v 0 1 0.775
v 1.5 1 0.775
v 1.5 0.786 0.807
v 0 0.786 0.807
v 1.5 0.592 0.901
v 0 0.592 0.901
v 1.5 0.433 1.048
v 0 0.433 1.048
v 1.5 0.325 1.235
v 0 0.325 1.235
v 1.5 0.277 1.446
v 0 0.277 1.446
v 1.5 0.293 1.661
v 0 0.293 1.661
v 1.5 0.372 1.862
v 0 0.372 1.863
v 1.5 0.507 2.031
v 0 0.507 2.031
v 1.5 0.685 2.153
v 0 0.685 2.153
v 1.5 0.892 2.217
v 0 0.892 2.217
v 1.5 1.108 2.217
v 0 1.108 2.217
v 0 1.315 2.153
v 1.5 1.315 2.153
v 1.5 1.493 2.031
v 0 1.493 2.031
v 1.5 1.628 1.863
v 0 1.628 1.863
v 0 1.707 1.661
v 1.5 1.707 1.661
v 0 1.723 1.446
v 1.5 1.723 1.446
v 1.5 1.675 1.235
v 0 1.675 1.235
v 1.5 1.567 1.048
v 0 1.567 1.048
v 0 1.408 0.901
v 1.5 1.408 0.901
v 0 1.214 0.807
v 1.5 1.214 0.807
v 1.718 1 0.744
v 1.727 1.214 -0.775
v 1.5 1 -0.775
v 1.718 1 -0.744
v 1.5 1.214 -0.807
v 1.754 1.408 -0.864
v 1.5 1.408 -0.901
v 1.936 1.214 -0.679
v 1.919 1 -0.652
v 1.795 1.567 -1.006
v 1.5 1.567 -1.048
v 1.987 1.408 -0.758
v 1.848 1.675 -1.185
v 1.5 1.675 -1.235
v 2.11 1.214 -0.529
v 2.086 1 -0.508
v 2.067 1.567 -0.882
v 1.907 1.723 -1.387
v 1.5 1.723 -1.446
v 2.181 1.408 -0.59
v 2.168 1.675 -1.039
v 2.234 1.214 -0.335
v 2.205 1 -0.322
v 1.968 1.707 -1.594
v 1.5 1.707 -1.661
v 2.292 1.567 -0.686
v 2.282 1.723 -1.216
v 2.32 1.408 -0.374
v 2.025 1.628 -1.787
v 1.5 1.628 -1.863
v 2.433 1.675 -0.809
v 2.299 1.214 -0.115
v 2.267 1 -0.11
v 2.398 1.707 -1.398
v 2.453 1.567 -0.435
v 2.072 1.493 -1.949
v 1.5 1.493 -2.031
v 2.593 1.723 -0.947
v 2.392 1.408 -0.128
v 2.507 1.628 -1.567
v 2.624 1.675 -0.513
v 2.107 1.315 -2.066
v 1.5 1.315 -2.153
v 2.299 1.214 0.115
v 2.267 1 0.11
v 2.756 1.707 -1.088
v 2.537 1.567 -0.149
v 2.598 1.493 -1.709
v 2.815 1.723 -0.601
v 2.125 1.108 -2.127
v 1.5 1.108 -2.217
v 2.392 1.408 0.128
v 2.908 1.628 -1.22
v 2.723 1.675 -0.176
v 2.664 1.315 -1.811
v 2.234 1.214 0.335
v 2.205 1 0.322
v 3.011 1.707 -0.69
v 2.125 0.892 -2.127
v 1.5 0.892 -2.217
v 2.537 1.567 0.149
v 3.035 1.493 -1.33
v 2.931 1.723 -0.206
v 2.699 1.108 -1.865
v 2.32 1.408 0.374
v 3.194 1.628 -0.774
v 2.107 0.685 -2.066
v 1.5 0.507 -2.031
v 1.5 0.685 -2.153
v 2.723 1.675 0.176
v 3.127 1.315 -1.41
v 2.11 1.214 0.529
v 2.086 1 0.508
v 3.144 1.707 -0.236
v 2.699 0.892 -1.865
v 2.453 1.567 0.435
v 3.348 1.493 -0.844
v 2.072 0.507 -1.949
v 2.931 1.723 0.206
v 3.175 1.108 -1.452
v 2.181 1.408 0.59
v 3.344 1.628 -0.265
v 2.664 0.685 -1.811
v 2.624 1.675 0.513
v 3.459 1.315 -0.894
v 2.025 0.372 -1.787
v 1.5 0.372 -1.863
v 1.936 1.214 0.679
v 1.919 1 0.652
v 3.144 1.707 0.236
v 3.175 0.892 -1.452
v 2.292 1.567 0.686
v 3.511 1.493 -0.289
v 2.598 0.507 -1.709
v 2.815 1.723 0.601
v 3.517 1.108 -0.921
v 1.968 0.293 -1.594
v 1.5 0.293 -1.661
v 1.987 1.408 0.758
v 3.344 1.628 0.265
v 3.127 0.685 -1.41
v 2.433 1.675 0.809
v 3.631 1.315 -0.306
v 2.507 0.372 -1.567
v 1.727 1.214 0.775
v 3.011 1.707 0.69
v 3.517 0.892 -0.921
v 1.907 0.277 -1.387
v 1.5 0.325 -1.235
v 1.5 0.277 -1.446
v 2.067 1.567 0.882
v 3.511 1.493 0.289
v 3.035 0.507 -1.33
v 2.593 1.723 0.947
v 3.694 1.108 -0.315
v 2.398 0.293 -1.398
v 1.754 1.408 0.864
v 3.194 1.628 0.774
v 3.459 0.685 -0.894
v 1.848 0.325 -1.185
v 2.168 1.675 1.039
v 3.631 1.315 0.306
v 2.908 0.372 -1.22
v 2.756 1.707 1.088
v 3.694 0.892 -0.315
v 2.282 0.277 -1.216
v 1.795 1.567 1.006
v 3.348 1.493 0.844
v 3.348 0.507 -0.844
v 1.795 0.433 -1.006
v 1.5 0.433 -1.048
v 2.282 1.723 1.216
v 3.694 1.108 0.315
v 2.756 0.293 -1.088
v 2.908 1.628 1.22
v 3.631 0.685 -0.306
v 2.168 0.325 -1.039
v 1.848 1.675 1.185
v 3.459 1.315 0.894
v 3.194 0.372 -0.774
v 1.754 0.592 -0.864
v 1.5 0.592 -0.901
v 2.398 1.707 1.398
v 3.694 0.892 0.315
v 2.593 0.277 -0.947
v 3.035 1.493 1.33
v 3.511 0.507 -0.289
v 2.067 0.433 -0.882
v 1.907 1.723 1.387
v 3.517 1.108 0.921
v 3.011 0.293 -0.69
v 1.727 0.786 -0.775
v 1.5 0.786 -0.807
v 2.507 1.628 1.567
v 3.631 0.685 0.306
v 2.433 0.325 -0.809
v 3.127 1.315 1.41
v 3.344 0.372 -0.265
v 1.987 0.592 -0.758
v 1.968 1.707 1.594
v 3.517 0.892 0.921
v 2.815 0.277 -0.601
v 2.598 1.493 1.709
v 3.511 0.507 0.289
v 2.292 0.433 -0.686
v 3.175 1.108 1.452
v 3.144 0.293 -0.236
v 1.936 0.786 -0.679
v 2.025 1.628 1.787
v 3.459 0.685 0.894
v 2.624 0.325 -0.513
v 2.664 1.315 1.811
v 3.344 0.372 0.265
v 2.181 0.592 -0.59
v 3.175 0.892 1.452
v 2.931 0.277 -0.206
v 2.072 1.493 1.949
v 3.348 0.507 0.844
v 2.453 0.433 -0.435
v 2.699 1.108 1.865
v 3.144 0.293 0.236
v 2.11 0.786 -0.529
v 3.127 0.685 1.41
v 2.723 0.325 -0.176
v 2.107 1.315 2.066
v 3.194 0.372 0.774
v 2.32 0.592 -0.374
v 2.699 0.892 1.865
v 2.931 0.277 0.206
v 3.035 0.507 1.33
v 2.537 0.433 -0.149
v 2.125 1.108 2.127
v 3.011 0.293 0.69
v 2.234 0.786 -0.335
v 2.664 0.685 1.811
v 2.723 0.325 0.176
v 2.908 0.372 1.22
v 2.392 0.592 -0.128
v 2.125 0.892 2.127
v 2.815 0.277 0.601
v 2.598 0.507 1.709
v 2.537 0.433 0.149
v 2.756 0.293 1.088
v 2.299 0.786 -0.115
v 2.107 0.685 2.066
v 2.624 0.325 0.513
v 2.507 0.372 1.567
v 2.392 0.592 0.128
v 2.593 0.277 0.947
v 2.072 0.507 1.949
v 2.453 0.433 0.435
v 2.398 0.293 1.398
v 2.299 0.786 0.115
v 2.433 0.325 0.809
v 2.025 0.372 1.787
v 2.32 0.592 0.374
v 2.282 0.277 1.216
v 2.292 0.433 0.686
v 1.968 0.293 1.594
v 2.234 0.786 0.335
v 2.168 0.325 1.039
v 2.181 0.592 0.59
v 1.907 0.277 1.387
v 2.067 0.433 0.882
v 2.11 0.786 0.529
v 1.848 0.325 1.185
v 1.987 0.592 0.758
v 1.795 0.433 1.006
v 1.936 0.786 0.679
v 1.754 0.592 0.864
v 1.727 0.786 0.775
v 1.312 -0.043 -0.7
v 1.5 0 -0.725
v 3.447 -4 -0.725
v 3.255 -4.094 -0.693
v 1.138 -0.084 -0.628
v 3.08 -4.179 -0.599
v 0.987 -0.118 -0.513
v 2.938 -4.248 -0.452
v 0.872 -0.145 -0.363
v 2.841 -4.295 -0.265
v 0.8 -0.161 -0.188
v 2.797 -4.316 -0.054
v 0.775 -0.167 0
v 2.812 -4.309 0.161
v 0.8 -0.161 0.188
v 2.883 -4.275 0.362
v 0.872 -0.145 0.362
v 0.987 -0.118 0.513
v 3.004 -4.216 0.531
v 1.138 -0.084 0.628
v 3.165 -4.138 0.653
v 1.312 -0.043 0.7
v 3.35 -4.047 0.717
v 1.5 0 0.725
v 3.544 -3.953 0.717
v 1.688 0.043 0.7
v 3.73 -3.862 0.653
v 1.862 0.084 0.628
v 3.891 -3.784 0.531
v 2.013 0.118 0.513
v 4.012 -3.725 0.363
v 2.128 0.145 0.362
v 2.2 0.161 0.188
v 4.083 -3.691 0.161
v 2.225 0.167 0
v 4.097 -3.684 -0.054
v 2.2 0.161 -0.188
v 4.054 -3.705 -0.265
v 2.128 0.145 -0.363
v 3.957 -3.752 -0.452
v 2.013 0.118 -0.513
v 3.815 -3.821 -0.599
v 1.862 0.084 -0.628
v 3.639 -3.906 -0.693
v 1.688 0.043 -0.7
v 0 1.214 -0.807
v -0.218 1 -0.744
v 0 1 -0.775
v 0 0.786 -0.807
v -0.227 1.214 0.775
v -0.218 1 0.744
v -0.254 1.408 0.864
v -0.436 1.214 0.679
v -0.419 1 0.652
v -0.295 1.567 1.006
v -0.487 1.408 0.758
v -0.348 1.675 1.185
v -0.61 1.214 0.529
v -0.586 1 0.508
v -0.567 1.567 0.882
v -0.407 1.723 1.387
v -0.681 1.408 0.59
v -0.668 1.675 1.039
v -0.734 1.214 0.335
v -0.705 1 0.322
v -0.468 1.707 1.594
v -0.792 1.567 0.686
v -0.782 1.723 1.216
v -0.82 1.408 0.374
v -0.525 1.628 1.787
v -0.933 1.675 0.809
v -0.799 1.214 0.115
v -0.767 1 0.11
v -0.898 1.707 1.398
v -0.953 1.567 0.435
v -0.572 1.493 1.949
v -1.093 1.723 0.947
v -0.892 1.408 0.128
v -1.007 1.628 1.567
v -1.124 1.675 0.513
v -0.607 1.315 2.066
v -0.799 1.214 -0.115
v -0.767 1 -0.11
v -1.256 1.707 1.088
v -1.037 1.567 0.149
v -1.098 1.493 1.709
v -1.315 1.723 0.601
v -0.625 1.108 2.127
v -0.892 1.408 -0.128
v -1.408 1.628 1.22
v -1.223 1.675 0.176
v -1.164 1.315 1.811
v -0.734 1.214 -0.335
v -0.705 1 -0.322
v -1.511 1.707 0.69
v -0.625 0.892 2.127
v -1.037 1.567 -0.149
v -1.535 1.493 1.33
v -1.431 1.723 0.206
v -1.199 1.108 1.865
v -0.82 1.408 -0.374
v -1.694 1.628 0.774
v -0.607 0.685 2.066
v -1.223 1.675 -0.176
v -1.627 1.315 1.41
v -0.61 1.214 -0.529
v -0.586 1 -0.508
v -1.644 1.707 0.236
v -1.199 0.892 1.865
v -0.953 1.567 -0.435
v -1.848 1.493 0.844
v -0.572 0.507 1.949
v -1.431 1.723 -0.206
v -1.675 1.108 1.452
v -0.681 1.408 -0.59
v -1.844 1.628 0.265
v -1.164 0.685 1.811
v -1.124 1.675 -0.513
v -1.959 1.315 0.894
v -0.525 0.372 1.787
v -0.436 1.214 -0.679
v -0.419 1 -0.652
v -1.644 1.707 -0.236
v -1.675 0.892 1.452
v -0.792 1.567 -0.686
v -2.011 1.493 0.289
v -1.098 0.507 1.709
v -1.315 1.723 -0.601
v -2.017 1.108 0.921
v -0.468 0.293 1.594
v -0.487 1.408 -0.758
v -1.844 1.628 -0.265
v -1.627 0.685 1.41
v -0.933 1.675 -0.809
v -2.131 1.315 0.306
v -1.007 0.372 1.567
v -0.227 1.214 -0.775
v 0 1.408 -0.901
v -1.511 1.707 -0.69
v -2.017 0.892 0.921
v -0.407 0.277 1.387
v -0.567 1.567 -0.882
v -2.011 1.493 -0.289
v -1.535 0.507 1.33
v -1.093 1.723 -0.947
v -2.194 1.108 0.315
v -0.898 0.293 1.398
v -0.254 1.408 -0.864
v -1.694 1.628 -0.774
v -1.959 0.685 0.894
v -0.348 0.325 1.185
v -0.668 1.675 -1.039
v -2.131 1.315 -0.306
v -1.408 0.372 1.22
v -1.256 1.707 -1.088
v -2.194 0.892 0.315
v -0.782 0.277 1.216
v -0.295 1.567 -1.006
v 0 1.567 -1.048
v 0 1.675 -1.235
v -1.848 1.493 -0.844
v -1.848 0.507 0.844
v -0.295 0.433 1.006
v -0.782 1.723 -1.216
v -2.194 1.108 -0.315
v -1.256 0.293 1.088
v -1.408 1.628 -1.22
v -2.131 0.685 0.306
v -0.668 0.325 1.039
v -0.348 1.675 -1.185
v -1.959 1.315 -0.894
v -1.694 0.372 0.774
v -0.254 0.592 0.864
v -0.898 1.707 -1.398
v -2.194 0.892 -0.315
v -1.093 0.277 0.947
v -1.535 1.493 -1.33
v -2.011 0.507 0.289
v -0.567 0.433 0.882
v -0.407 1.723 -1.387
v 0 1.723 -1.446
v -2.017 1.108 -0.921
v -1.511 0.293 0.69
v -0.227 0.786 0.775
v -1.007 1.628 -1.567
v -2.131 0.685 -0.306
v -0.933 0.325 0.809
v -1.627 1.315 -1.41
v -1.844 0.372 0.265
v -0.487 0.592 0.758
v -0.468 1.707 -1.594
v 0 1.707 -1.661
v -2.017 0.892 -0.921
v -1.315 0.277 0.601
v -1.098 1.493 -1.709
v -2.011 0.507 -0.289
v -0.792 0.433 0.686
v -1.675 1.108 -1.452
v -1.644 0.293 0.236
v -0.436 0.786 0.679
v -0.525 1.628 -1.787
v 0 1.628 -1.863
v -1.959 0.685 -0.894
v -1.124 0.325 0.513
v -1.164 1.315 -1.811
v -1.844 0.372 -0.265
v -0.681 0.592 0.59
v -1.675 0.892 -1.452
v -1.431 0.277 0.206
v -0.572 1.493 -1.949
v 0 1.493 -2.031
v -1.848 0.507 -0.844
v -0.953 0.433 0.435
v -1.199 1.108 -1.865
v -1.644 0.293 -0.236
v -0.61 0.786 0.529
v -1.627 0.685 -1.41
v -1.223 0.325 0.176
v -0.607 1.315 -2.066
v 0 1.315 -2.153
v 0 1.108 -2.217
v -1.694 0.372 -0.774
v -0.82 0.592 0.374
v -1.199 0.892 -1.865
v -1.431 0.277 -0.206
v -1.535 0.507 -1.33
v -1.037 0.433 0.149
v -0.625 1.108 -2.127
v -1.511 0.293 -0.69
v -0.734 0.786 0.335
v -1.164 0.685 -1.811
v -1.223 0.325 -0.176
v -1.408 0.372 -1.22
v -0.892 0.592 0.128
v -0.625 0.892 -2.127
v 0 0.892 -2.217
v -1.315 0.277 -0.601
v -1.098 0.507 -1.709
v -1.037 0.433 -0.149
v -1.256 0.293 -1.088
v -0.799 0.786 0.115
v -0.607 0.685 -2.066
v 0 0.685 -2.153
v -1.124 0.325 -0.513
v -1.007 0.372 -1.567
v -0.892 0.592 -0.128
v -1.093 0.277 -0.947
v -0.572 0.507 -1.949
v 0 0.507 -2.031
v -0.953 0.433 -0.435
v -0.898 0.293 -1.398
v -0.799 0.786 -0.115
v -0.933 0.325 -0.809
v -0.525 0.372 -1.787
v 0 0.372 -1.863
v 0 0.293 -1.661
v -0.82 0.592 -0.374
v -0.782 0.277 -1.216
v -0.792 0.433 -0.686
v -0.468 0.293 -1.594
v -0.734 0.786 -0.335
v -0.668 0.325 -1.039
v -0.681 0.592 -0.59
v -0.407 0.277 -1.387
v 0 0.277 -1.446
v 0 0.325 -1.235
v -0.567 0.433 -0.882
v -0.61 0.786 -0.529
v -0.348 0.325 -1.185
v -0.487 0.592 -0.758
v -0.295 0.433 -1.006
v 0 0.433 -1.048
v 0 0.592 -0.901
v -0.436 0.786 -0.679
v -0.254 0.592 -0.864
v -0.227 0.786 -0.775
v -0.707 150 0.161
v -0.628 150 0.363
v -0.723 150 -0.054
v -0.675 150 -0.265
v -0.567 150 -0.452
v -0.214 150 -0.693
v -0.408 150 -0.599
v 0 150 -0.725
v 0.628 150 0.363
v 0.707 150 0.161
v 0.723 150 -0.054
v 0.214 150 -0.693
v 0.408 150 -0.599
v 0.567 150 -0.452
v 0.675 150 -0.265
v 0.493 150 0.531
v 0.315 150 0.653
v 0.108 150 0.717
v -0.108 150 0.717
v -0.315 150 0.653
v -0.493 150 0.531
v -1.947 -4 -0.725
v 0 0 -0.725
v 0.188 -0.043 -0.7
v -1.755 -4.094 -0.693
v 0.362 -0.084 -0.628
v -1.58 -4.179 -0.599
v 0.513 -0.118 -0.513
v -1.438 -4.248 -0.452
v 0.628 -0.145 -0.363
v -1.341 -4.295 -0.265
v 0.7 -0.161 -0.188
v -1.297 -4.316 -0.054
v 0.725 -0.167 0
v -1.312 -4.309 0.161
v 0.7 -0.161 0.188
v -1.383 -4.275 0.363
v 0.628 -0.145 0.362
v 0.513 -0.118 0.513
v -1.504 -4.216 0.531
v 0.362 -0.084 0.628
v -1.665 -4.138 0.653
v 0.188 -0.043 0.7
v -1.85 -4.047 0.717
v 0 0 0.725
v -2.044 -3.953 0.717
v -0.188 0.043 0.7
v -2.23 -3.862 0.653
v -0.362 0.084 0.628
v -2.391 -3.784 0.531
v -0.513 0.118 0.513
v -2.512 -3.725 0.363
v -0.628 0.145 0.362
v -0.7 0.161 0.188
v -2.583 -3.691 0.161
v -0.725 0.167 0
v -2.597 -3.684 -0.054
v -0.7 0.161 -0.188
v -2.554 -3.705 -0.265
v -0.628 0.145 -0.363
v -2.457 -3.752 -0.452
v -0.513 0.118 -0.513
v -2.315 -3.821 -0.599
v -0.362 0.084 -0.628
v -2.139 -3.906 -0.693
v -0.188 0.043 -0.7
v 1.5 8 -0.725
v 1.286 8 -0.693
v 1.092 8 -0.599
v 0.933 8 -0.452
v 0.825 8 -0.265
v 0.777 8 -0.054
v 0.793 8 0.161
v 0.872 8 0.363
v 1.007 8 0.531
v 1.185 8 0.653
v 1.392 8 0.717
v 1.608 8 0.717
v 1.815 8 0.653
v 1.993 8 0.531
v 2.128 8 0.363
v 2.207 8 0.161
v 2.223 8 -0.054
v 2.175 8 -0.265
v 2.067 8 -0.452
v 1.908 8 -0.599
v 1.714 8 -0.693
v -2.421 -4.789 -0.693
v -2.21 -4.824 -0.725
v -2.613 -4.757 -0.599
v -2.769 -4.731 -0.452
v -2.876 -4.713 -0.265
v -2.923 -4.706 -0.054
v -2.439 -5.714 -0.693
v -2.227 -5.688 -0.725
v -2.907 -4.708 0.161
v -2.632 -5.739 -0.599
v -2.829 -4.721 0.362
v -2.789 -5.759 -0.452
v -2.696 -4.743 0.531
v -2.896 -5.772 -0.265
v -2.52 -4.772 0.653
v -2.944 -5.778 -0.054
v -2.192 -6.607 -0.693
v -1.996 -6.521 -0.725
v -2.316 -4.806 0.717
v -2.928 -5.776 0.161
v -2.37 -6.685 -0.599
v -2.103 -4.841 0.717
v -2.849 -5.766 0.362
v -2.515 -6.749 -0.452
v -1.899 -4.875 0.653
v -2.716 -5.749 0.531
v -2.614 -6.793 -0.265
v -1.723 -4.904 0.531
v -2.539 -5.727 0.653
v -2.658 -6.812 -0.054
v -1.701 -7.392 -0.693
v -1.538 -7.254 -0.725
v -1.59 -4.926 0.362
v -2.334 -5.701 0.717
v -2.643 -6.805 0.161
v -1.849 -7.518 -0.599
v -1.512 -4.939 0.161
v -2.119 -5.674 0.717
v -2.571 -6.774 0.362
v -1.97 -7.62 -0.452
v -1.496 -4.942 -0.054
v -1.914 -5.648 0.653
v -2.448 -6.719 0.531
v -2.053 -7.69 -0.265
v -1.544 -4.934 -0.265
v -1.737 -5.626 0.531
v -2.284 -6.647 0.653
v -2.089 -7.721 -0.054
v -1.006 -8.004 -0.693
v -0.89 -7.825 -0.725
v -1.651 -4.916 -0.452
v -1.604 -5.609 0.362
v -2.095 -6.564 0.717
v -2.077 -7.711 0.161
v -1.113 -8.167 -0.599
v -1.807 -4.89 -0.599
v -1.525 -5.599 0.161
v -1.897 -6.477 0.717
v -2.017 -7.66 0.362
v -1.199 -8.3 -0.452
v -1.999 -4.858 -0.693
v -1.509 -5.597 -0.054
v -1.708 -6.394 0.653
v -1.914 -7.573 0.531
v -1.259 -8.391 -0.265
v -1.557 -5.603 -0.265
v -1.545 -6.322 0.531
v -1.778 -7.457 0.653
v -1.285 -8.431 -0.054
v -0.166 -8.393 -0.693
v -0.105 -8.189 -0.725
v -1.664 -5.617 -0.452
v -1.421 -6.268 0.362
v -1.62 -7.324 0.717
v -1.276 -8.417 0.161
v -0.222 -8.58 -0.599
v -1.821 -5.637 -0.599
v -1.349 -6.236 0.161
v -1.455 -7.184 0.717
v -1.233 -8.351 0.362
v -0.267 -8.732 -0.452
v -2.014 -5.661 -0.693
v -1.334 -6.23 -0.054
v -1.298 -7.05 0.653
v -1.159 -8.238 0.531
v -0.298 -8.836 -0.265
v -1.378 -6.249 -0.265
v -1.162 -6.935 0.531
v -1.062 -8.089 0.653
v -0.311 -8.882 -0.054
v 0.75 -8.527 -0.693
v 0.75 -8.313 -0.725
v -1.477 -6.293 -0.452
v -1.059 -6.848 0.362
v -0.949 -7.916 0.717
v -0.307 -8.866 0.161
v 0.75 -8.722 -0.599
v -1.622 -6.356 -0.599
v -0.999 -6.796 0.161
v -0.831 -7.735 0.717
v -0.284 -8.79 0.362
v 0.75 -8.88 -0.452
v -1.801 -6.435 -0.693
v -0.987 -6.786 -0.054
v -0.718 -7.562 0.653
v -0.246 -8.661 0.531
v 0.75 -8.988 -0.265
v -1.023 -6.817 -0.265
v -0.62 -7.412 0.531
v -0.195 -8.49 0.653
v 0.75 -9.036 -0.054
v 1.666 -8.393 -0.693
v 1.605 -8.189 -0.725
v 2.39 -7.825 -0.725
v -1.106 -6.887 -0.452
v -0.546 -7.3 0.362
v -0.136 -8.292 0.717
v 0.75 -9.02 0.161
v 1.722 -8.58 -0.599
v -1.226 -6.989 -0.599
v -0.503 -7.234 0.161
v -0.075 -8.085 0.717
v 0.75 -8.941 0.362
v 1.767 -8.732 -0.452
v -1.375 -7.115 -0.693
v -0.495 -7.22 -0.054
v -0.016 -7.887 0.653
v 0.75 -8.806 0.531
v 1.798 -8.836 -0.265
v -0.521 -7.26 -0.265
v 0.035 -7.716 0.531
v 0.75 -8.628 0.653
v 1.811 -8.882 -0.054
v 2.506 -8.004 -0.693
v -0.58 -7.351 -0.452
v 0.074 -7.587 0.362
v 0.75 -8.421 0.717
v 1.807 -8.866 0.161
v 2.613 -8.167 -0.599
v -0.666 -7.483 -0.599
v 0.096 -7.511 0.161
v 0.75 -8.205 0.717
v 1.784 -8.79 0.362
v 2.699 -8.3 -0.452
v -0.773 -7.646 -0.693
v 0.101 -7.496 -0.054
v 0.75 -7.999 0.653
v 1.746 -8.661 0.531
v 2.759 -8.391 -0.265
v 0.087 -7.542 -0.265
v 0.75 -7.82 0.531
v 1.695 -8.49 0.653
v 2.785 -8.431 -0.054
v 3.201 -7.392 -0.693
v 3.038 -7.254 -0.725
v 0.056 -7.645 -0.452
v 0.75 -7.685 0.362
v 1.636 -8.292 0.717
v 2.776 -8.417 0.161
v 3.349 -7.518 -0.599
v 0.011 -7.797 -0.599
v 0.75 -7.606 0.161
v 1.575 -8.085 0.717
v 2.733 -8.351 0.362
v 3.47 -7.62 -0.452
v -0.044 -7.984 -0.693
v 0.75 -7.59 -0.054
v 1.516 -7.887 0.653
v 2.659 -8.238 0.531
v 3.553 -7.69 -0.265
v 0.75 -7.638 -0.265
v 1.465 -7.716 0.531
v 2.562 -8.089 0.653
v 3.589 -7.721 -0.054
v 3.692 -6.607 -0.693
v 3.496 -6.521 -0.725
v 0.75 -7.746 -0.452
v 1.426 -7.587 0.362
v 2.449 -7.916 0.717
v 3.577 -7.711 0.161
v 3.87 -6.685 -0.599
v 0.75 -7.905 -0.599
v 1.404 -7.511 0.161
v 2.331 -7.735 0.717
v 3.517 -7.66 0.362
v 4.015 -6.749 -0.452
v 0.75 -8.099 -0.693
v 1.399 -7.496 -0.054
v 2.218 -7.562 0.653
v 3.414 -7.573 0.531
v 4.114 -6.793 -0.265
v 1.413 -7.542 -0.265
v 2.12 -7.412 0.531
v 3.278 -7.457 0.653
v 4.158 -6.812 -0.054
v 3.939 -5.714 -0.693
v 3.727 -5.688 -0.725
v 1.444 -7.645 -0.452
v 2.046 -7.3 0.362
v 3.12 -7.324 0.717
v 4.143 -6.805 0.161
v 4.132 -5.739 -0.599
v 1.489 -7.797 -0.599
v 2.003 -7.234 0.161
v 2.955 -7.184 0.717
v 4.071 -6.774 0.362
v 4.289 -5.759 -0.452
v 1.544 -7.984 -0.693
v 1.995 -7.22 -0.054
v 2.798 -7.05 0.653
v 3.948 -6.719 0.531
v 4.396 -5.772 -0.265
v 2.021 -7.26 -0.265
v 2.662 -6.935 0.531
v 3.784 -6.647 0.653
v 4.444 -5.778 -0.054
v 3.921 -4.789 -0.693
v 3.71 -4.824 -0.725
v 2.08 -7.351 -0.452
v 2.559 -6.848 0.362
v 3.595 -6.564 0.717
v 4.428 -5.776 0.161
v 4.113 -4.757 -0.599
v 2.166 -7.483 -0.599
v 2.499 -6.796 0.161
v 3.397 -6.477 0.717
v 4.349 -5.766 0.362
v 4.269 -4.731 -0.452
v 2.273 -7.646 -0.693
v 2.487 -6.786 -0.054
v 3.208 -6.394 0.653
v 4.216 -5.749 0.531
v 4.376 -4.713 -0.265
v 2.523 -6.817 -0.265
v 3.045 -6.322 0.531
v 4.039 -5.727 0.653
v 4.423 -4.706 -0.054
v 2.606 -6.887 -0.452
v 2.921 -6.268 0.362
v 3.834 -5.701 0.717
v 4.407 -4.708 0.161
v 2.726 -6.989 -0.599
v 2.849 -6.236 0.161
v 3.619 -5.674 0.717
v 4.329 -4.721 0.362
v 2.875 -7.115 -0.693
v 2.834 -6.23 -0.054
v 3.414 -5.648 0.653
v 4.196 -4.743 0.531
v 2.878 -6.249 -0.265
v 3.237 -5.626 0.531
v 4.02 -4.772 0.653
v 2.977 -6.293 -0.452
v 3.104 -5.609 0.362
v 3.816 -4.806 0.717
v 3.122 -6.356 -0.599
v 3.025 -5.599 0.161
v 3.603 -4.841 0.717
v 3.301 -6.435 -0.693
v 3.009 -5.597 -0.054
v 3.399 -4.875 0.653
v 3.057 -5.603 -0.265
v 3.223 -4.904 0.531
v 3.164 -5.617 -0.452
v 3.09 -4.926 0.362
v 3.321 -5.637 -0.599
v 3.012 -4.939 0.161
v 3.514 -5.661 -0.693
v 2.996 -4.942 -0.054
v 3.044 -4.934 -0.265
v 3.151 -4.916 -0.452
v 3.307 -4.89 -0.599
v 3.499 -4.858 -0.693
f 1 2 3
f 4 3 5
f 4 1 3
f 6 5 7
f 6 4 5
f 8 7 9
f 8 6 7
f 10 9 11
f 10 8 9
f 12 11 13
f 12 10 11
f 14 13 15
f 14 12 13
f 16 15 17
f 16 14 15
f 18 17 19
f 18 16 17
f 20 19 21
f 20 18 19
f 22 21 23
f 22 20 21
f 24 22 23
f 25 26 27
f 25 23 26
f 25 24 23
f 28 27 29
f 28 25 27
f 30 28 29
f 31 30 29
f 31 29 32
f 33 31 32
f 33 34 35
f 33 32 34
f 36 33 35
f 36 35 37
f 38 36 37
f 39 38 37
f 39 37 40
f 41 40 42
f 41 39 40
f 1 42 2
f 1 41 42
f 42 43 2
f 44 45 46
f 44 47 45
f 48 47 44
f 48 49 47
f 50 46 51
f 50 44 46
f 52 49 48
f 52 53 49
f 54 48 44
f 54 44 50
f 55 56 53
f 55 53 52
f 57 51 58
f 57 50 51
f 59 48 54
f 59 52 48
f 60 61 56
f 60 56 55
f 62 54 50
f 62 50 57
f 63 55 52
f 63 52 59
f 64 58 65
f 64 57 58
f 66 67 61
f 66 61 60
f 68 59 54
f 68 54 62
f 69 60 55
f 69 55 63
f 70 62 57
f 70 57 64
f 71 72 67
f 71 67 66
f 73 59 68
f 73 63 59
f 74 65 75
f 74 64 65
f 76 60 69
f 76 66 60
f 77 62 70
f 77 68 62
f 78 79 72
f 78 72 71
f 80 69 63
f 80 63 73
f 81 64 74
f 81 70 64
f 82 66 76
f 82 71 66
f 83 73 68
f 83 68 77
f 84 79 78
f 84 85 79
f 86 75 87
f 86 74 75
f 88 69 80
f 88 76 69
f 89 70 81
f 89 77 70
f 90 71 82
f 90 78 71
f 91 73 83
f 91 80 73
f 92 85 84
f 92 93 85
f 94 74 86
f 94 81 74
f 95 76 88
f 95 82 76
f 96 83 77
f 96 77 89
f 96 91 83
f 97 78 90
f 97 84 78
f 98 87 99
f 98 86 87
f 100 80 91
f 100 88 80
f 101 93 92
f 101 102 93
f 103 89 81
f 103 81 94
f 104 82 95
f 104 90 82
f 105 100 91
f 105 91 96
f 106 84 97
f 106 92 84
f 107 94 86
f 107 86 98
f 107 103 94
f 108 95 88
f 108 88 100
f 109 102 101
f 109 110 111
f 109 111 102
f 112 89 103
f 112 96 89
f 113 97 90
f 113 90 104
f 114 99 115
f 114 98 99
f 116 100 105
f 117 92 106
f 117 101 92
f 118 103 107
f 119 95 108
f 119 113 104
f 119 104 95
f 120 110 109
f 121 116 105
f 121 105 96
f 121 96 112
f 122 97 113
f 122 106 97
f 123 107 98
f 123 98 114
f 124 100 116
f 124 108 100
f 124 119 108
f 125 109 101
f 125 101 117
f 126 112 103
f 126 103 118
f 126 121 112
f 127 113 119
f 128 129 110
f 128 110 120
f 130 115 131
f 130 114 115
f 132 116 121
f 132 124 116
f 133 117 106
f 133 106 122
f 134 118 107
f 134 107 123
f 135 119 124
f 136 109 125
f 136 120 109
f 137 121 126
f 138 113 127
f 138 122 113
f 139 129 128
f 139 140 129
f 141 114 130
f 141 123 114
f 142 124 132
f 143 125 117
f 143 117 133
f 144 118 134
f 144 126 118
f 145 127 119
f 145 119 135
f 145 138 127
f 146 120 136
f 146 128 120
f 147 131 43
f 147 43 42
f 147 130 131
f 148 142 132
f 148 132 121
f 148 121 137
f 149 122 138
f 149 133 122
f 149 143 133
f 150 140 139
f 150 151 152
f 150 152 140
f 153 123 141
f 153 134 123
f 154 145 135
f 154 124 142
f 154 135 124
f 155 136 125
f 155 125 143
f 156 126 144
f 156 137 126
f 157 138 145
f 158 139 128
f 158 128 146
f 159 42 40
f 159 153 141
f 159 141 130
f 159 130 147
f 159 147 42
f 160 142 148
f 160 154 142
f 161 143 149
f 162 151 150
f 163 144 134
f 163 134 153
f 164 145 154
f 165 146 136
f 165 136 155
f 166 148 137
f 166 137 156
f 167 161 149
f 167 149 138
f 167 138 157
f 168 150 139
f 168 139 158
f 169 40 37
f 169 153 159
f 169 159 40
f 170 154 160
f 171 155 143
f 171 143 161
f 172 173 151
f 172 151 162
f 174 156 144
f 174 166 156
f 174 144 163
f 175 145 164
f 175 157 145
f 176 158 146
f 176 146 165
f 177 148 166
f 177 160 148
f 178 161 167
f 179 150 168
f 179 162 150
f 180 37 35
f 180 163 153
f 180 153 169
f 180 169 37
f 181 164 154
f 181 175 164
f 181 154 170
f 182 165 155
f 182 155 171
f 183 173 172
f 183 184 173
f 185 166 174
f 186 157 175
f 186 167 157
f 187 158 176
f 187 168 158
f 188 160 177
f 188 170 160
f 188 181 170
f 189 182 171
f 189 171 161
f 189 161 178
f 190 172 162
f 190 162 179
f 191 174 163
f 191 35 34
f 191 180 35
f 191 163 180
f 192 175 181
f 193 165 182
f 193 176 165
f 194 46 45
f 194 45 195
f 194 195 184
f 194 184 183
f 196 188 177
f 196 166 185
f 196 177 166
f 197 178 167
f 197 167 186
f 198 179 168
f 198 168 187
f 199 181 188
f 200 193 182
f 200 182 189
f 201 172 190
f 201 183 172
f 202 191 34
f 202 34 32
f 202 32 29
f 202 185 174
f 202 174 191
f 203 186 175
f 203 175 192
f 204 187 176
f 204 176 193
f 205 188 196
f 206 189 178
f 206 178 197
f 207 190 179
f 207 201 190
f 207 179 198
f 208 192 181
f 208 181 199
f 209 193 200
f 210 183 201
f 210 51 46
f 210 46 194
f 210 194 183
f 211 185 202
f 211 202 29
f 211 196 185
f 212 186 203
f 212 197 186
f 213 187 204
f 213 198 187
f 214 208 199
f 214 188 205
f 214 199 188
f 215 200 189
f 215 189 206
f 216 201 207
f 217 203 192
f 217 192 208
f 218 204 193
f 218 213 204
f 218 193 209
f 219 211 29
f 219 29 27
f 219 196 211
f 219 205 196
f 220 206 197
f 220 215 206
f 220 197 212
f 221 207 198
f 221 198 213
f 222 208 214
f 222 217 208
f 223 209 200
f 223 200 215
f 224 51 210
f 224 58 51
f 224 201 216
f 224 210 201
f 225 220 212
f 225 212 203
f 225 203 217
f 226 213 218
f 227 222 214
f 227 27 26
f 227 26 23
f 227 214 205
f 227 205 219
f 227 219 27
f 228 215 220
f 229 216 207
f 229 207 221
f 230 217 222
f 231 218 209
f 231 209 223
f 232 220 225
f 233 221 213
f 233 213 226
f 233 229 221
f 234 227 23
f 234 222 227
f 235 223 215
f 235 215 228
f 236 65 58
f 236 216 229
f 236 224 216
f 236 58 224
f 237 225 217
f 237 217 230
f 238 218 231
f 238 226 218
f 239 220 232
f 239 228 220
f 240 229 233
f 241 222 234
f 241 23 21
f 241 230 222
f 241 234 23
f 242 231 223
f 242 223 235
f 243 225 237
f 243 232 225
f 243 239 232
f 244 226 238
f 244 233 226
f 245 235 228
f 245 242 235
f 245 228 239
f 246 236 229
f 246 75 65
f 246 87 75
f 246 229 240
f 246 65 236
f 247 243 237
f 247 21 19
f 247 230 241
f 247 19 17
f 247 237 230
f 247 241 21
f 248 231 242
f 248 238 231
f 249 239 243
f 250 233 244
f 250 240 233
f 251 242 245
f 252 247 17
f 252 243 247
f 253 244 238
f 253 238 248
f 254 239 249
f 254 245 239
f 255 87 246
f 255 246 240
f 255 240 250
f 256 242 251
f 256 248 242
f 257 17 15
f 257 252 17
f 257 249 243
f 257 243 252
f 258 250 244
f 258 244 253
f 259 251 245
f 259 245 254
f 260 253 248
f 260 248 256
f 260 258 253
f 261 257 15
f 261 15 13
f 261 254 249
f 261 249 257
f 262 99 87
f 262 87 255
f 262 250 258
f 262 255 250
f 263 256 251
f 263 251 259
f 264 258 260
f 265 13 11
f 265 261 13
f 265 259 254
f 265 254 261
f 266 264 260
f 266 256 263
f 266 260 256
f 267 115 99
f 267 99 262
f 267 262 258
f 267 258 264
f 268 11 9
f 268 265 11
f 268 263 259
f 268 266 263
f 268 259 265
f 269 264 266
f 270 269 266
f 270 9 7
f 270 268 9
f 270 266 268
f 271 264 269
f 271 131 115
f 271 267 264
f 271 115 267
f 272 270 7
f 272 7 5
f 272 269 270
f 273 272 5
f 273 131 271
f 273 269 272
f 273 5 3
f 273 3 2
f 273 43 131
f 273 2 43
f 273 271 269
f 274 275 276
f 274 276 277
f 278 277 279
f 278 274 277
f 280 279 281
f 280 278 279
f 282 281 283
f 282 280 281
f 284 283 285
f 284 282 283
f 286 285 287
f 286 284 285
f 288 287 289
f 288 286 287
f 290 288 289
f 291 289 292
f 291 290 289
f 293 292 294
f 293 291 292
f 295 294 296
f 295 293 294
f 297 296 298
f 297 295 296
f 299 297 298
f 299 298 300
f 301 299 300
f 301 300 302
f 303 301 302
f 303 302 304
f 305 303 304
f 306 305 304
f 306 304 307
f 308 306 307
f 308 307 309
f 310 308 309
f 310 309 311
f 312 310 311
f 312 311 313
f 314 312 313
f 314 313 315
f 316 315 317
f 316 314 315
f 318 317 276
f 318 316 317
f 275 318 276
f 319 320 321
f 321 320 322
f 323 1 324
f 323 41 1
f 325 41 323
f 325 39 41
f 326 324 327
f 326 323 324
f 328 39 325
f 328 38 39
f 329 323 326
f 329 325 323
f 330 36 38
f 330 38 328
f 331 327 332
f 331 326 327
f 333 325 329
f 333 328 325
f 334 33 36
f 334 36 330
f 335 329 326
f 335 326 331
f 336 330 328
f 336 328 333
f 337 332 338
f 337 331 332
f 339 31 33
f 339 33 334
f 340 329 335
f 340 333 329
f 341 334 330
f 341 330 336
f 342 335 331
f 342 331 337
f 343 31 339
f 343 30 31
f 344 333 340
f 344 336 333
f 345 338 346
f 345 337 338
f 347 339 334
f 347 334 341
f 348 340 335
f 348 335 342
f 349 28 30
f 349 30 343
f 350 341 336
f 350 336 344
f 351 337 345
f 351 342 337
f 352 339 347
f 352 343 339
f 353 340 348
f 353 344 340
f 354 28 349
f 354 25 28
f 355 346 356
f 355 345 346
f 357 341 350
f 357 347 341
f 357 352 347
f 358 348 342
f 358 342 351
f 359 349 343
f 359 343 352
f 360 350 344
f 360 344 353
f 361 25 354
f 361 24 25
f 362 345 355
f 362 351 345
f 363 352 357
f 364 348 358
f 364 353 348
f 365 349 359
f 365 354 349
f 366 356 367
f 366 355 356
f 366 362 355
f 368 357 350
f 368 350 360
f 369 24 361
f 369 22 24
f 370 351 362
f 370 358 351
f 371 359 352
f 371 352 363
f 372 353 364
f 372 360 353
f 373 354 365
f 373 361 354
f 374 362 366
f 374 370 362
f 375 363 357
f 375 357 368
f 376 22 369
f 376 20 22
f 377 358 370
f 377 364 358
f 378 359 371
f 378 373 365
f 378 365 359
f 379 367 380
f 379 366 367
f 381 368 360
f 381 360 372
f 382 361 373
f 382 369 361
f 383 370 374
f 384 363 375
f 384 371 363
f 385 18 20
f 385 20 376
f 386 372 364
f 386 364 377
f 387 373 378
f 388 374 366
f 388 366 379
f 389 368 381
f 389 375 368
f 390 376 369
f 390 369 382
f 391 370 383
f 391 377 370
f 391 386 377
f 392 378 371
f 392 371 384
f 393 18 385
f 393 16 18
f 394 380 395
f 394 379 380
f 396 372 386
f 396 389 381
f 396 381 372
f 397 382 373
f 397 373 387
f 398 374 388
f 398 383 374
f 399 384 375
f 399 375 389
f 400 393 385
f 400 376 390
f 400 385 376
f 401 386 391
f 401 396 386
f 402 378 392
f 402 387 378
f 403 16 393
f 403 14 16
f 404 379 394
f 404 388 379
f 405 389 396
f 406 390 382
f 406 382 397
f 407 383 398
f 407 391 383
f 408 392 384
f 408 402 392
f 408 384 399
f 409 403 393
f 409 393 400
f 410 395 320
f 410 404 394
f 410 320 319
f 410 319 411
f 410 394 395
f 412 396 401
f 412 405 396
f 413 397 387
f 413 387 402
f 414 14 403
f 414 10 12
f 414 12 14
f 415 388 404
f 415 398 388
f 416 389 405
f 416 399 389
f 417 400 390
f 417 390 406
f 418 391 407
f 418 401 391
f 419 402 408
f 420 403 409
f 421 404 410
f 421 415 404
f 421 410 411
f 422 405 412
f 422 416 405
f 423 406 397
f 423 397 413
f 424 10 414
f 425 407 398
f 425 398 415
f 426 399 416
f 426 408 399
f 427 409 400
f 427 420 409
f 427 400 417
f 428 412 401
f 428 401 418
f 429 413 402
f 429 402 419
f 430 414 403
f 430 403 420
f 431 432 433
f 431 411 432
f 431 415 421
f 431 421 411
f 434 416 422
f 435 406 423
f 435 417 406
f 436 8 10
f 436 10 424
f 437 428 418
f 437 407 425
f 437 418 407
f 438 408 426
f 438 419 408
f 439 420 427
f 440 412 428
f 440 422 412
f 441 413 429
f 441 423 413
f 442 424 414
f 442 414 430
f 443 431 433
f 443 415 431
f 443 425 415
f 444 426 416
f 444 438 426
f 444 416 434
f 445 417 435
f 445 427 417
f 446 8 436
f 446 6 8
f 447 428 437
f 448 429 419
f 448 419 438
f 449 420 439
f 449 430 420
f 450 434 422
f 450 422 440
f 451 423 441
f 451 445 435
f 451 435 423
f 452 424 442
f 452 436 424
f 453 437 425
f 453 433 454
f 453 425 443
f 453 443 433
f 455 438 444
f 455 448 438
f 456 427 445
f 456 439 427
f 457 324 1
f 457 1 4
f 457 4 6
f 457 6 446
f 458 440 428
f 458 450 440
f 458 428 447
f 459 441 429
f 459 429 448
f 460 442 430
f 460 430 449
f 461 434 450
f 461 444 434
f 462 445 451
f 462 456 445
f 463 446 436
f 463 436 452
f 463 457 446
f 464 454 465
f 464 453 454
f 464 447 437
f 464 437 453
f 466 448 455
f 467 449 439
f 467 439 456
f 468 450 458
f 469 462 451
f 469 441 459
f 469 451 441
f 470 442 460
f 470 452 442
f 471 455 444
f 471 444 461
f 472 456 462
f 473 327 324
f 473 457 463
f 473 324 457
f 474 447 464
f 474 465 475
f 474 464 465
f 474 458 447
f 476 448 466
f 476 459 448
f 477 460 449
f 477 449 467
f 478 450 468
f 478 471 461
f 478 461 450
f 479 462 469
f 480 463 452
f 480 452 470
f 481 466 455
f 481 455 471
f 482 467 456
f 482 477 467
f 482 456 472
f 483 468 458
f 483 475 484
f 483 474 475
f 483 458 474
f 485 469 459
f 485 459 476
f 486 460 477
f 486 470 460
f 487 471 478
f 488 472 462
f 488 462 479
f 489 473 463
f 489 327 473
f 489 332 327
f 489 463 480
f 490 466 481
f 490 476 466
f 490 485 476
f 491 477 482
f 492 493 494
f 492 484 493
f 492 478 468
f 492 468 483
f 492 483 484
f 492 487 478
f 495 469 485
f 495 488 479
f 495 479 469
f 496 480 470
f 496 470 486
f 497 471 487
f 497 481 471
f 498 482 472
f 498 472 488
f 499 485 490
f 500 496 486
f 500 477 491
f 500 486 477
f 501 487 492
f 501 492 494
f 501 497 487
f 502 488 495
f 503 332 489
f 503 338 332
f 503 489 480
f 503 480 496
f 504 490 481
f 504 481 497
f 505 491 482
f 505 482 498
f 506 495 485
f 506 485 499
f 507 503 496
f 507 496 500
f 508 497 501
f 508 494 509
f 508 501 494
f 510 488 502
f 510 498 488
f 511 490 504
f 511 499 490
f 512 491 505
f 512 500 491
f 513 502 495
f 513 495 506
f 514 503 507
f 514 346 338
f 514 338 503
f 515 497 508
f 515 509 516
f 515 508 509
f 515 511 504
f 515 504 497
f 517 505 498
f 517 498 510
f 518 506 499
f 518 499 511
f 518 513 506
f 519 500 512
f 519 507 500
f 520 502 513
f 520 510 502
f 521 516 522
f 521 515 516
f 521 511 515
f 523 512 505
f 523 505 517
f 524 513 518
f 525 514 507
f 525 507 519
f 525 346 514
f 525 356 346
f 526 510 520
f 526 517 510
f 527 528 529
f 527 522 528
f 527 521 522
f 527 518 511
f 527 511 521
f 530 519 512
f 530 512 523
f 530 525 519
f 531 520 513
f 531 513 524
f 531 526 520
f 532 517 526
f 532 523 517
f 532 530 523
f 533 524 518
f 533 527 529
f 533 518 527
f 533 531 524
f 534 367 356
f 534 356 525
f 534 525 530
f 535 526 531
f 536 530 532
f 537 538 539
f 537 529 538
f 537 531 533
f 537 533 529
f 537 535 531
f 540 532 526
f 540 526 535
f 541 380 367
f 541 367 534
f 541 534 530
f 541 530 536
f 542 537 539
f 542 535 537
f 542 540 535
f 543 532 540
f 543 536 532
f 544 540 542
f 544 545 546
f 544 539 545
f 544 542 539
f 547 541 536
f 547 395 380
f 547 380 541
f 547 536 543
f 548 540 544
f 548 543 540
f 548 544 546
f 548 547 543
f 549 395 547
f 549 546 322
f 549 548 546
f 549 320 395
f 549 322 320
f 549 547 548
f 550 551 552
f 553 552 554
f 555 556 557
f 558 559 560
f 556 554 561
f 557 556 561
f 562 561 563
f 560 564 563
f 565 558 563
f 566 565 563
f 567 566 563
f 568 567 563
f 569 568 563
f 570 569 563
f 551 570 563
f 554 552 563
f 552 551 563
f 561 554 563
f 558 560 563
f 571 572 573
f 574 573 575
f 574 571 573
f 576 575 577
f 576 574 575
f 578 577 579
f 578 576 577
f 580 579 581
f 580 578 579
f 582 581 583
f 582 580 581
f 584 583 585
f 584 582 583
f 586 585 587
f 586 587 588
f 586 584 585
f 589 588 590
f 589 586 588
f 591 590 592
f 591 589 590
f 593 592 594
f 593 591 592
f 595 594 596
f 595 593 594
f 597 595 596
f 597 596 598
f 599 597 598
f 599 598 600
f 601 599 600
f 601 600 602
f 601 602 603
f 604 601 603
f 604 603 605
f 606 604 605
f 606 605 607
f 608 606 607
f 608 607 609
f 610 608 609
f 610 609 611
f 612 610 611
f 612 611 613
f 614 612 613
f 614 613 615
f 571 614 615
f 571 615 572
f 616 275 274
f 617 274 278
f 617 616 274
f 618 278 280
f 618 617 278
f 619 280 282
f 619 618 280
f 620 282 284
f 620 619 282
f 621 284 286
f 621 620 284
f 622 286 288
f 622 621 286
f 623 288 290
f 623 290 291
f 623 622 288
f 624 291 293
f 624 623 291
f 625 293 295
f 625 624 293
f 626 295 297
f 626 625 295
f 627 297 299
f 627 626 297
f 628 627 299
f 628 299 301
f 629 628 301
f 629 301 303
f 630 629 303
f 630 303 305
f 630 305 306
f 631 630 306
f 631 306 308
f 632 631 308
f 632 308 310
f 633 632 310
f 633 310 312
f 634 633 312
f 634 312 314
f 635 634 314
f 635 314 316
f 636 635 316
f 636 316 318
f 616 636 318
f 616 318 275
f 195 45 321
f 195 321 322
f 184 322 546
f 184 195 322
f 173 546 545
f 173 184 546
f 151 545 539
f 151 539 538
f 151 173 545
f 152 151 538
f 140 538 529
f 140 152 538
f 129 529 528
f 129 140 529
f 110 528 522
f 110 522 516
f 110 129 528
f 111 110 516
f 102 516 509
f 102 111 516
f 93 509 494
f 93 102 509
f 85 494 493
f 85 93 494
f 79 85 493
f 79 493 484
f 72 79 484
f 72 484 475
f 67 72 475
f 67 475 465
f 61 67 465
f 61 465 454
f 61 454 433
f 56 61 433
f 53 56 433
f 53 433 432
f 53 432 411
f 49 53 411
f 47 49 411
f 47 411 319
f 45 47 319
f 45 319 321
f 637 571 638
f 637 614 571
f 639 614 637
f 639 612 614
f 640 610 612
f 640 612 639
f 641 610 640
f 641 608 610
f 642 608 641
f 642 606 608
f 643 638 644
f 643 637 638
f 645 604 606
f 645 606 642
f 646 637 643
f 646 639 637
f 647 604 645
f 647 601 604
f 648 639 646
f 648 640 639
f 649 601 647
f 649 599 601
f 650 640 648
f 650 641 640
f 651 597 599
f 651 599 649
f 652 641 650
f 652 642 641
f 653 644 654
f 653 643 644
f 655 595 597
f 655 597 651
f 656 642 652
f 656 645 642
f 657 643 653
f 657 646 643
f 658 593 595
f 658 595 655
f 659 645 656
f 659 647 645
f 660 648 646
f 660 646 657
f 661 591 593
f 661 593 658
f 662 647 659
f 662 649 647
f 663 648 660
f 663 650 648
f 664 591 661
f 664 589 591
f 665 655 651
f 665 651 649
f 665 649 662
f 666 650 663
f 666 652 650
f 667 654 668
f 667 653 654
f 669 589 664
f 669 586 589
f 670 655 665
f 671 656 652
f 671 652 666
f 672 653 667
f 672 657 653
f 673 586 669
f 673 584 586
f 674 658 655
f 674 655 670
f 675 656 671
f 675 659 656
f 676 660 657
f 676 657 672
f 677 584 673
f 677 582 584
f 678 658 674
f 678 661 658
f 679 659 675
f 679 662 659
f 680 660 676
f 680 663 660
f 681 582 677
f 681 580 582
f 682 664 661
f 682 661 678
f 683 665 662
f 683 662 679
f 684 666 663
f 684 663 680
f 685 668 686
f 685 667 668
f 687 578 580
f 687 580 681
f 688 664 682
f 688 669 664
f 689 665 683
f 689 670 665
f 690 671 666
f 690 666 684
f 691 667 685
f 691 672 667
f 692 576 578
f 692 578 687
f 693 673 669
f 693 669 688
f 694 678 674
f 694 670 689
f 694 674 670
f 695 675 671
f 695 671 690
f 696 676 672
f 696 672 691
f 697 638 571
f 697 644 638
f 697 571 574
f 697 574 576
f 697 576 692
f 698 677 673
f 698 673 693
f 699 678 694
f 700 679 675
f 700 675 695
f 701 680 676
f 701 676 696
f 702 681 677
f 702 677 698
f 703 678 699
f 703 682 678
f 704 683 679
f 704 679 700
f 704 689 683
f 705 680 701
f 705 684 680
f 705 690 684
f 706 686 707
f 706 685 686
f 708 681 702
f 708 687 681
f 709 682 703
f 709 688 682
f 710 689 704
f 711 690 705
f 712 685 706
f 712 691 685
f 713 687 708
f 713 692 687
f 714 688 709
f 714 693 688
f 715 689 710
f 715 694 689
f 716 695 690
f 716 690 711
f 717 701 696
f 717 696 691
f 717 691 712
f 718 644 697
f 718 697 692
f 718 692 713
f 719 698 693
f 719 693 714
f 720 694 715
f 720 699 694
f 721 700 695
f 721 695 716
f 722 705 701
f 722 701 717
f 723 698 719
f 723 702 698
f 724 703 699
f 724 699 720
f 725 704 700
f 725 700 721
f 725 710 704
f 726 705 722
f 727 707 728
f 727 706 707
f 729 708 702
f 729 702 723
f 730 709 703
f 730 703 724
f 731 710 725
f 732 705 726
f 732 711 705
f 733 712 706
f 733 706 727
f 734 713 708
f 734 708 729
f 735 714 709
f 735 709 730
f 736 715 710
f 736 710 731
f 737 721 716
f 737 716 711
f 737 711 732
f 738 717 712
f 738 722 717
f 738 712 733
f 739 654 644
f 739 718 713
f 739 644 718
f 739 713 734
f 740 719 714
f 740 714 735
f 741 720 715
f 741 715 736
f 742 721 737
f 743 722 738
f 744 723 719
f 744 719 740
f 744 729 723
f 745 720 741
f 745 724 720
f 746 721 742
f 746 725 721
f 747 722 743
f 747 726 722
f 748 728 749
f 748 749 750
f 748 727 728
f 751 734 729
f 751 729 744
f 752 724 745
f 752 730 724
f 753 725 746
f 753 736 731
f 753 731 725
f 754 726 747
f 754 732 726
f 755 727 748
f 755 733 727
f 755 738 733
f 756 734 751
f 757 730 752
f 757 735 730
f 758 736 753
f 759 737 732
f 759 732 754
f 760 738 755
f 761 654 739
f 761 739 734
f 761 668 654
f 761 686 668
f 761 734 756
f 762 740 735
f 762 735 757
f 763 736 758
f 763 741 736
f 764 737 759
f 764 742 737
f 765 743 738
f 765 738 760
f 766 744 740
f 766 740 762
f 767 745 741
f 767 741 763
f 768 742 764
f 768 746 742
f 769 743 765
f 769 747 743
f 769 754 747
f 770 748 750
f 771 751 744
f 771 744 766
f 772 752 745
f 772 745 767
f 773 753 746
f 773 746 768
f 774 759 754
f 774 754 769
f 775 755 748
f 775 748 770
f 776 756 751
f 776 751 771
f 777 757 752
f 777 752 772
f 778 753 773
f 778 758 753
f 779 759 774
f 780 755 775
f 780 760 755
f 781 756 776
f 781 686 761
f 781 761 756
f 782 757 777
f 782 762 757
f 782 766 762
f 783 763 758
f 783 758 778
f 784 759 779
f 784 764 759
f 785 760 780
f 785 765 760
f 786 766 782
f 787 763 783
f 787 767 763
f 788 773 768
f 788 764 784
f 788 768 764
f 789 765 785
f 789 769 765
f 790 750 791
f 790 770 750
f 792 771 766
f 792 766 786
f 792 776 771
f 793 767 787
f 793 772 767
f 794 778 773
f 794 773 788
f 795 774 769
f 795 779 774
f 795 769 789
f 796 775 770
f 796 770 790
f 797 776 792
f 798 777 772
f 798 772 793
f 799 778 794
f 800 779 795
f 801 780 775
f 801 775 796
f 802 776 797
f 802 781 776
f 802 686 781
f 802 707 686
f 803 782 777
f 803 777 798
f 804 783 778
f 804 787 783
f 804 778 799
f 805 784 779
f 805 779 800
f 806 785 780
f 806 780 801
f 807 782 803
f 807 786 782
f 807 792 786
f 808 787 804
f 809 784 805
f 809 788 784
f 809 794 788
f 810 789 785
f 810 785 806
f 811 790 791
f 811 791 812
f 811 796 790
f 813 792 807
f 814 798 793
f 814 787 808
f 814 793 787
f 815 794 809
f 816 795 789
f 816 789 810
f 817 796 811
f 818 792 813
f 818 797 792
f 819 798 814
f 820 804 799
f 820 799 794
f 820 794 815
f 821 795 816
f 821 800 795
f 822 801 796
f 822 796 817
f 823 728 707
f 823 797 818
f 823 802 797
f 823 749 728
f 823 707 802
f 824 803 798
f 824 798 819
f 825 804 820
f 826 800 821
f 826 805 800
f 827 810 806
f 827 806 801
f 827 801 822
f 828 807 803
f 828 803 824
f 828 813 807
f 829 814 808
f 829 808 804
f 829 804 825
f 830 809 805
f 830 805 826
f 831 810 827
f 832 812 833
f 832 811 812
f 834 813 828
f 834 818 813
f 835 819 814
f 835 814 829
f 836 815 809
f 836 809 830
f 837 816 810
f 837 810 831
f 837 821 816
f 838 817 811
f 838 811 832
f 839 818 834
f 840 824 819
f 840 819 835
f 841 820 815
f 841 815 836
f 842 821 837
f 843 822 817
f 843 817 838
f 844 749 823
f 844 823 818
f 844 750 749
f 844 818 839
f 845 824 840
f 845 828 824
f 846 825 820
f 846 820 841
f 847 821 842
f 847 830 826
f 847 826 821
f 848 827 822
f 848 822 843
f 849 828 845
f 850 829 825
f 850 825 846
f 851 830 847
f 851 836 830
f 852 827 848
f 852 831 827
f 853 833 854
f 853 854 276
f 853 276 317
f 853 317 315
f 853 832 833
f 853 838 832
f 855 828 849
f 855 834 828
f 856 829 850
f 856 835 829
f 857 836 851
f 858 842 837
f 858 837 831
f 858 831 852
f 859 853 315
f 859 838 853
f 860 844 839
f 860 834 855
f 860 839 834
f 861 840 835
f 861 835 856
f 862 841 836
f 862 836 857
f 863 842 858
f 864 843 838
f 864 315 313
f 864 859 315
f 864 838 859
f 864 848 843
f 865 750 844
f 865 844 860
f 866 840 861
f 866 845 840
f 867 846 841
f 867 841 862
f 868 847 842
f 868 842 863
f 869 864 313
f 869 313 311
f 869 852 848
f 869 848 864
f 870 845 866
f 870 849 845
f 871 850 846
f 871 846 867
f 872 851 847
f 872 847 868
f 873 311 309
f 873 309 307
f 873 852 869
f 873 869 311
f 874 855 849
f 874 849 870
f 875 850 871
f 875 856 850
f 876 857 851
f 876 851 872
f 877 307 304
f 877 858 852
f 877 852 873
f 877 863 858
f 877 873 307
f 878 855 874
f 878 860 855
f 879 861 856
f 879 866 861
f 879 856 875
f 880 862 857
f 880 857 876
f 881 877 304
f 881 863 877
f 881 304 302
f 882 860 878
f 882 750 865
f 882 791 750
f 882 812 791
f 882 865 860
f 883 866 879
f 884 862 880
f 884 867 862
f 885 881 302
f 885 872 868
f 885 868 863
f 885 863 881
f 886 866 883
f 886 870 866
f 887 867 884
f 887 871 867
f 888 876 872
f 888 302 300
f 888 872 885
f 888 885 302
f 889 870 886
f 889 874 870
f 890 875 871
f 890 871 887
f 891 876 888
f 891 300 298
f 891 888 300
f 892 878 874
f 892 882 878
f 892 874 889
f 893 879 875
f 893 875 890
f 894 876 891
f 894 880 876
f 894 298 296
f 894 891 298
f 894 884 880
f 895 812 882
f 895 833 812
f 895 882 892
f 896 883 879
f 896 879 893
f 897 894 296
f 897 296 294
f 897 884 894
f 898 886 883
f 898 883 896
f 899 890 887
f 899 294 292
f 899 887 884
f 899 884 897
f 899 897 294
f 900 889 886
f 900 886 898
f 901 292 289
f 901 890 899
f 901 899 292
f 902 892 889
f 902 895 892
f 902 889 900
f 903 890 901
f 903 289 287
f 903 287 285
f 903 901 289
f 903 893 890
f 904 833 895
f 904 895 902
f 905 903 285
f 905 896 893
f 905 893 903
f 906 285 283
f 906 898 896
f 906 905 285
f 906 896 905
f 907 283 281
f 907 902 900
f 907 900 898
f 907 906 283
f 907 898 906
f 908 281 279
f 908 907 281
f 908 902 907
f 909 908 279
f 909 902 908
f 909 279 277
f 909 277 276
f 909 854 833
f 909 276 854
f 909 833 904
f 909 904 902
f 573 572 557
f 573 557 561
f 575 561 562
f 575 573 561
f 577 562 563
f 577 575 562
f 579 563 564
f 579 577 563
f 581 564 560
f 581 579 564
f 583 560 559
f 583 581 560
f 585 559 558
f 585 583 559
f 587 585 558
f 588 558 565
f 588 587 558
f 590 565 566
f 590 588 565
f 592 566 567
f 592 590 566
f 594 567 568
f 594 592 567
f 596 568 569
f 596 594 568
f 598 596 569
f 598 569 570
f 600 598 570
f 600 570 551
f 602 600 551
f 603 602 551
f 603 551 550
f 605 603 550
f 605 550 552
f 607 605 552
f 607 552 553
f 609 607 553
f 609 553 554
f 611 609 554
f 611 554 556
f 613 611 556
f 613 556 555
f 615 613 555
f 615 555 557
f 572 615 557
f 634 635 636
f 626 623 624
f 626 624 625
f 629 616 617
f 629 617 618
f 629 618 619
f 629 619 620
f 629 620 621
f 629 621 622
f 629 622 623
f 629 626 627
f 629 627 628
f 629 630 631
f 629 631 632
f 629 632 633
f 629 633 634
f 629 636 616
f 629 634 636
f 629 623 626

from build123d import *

# Parameters (mm, degrees)
SWEEP1_PROFILE_R = 0.725
SWEEP2_PROFILE_R = 0.725


with BuildPart() as part:
    # Sweep1: sweep along a path in Sketch1
    with BuildLine(Plane.XY) as sweep1_path:
        Line((0, 150), (0, 0))
        Line((0, 0), (-1.947336329, -4))
        ThreePointArc((-1.947336329, -4), (0.75, -8.313155256), (3.447336329, -4))
        Line((3.447336329, -4), (1.5, 0))
        Line((1.5, 0), (1.5, 8))
    # Sweep1 profile (on start of the path) → Sweep1 (sweep)
    with BuildSketch(Plane(origin=(0, 150, 0), x_dir=(0, 0, -1), z_dir=(0, -1, 0))):
        Circle(SWEEP1_PROFILE_R)
    sweep(path=sweep1_path.line, transition=Transition.RIGHT)


with BuildPart() as body_2:
    # Sweep2: sweep along a path in Sketch18
    with BuildLine(Plane(origin=(0, 1, 0), x_dir=(1, 0, 0), z_dir=(0, 1, 0))) as sweep2_path:
        Line((0, 1.5), (1.5, 1.5))
        ThreePointArc((1.5, 1.5), (3, 0), (1.5, -1.5))
        Line((1.5, -1.5), (0, -1.5))
        ThreePointArc((0, -1.5), (-1.5, 0), (0, 1.5))
    # Sweep2 profile (on start of the path) → Sweep2 (sweep)
    with BuildSketch(Plane(origin=(0, 1, -1.5), x_dir=(0, 0, 1), z_dir=(1, 0, 0))):
        Circle(SWEEP2_PROFILE_R)
    sweep(path=sweep2_path.line)


solid = Compound([part.part, body_2.part])
